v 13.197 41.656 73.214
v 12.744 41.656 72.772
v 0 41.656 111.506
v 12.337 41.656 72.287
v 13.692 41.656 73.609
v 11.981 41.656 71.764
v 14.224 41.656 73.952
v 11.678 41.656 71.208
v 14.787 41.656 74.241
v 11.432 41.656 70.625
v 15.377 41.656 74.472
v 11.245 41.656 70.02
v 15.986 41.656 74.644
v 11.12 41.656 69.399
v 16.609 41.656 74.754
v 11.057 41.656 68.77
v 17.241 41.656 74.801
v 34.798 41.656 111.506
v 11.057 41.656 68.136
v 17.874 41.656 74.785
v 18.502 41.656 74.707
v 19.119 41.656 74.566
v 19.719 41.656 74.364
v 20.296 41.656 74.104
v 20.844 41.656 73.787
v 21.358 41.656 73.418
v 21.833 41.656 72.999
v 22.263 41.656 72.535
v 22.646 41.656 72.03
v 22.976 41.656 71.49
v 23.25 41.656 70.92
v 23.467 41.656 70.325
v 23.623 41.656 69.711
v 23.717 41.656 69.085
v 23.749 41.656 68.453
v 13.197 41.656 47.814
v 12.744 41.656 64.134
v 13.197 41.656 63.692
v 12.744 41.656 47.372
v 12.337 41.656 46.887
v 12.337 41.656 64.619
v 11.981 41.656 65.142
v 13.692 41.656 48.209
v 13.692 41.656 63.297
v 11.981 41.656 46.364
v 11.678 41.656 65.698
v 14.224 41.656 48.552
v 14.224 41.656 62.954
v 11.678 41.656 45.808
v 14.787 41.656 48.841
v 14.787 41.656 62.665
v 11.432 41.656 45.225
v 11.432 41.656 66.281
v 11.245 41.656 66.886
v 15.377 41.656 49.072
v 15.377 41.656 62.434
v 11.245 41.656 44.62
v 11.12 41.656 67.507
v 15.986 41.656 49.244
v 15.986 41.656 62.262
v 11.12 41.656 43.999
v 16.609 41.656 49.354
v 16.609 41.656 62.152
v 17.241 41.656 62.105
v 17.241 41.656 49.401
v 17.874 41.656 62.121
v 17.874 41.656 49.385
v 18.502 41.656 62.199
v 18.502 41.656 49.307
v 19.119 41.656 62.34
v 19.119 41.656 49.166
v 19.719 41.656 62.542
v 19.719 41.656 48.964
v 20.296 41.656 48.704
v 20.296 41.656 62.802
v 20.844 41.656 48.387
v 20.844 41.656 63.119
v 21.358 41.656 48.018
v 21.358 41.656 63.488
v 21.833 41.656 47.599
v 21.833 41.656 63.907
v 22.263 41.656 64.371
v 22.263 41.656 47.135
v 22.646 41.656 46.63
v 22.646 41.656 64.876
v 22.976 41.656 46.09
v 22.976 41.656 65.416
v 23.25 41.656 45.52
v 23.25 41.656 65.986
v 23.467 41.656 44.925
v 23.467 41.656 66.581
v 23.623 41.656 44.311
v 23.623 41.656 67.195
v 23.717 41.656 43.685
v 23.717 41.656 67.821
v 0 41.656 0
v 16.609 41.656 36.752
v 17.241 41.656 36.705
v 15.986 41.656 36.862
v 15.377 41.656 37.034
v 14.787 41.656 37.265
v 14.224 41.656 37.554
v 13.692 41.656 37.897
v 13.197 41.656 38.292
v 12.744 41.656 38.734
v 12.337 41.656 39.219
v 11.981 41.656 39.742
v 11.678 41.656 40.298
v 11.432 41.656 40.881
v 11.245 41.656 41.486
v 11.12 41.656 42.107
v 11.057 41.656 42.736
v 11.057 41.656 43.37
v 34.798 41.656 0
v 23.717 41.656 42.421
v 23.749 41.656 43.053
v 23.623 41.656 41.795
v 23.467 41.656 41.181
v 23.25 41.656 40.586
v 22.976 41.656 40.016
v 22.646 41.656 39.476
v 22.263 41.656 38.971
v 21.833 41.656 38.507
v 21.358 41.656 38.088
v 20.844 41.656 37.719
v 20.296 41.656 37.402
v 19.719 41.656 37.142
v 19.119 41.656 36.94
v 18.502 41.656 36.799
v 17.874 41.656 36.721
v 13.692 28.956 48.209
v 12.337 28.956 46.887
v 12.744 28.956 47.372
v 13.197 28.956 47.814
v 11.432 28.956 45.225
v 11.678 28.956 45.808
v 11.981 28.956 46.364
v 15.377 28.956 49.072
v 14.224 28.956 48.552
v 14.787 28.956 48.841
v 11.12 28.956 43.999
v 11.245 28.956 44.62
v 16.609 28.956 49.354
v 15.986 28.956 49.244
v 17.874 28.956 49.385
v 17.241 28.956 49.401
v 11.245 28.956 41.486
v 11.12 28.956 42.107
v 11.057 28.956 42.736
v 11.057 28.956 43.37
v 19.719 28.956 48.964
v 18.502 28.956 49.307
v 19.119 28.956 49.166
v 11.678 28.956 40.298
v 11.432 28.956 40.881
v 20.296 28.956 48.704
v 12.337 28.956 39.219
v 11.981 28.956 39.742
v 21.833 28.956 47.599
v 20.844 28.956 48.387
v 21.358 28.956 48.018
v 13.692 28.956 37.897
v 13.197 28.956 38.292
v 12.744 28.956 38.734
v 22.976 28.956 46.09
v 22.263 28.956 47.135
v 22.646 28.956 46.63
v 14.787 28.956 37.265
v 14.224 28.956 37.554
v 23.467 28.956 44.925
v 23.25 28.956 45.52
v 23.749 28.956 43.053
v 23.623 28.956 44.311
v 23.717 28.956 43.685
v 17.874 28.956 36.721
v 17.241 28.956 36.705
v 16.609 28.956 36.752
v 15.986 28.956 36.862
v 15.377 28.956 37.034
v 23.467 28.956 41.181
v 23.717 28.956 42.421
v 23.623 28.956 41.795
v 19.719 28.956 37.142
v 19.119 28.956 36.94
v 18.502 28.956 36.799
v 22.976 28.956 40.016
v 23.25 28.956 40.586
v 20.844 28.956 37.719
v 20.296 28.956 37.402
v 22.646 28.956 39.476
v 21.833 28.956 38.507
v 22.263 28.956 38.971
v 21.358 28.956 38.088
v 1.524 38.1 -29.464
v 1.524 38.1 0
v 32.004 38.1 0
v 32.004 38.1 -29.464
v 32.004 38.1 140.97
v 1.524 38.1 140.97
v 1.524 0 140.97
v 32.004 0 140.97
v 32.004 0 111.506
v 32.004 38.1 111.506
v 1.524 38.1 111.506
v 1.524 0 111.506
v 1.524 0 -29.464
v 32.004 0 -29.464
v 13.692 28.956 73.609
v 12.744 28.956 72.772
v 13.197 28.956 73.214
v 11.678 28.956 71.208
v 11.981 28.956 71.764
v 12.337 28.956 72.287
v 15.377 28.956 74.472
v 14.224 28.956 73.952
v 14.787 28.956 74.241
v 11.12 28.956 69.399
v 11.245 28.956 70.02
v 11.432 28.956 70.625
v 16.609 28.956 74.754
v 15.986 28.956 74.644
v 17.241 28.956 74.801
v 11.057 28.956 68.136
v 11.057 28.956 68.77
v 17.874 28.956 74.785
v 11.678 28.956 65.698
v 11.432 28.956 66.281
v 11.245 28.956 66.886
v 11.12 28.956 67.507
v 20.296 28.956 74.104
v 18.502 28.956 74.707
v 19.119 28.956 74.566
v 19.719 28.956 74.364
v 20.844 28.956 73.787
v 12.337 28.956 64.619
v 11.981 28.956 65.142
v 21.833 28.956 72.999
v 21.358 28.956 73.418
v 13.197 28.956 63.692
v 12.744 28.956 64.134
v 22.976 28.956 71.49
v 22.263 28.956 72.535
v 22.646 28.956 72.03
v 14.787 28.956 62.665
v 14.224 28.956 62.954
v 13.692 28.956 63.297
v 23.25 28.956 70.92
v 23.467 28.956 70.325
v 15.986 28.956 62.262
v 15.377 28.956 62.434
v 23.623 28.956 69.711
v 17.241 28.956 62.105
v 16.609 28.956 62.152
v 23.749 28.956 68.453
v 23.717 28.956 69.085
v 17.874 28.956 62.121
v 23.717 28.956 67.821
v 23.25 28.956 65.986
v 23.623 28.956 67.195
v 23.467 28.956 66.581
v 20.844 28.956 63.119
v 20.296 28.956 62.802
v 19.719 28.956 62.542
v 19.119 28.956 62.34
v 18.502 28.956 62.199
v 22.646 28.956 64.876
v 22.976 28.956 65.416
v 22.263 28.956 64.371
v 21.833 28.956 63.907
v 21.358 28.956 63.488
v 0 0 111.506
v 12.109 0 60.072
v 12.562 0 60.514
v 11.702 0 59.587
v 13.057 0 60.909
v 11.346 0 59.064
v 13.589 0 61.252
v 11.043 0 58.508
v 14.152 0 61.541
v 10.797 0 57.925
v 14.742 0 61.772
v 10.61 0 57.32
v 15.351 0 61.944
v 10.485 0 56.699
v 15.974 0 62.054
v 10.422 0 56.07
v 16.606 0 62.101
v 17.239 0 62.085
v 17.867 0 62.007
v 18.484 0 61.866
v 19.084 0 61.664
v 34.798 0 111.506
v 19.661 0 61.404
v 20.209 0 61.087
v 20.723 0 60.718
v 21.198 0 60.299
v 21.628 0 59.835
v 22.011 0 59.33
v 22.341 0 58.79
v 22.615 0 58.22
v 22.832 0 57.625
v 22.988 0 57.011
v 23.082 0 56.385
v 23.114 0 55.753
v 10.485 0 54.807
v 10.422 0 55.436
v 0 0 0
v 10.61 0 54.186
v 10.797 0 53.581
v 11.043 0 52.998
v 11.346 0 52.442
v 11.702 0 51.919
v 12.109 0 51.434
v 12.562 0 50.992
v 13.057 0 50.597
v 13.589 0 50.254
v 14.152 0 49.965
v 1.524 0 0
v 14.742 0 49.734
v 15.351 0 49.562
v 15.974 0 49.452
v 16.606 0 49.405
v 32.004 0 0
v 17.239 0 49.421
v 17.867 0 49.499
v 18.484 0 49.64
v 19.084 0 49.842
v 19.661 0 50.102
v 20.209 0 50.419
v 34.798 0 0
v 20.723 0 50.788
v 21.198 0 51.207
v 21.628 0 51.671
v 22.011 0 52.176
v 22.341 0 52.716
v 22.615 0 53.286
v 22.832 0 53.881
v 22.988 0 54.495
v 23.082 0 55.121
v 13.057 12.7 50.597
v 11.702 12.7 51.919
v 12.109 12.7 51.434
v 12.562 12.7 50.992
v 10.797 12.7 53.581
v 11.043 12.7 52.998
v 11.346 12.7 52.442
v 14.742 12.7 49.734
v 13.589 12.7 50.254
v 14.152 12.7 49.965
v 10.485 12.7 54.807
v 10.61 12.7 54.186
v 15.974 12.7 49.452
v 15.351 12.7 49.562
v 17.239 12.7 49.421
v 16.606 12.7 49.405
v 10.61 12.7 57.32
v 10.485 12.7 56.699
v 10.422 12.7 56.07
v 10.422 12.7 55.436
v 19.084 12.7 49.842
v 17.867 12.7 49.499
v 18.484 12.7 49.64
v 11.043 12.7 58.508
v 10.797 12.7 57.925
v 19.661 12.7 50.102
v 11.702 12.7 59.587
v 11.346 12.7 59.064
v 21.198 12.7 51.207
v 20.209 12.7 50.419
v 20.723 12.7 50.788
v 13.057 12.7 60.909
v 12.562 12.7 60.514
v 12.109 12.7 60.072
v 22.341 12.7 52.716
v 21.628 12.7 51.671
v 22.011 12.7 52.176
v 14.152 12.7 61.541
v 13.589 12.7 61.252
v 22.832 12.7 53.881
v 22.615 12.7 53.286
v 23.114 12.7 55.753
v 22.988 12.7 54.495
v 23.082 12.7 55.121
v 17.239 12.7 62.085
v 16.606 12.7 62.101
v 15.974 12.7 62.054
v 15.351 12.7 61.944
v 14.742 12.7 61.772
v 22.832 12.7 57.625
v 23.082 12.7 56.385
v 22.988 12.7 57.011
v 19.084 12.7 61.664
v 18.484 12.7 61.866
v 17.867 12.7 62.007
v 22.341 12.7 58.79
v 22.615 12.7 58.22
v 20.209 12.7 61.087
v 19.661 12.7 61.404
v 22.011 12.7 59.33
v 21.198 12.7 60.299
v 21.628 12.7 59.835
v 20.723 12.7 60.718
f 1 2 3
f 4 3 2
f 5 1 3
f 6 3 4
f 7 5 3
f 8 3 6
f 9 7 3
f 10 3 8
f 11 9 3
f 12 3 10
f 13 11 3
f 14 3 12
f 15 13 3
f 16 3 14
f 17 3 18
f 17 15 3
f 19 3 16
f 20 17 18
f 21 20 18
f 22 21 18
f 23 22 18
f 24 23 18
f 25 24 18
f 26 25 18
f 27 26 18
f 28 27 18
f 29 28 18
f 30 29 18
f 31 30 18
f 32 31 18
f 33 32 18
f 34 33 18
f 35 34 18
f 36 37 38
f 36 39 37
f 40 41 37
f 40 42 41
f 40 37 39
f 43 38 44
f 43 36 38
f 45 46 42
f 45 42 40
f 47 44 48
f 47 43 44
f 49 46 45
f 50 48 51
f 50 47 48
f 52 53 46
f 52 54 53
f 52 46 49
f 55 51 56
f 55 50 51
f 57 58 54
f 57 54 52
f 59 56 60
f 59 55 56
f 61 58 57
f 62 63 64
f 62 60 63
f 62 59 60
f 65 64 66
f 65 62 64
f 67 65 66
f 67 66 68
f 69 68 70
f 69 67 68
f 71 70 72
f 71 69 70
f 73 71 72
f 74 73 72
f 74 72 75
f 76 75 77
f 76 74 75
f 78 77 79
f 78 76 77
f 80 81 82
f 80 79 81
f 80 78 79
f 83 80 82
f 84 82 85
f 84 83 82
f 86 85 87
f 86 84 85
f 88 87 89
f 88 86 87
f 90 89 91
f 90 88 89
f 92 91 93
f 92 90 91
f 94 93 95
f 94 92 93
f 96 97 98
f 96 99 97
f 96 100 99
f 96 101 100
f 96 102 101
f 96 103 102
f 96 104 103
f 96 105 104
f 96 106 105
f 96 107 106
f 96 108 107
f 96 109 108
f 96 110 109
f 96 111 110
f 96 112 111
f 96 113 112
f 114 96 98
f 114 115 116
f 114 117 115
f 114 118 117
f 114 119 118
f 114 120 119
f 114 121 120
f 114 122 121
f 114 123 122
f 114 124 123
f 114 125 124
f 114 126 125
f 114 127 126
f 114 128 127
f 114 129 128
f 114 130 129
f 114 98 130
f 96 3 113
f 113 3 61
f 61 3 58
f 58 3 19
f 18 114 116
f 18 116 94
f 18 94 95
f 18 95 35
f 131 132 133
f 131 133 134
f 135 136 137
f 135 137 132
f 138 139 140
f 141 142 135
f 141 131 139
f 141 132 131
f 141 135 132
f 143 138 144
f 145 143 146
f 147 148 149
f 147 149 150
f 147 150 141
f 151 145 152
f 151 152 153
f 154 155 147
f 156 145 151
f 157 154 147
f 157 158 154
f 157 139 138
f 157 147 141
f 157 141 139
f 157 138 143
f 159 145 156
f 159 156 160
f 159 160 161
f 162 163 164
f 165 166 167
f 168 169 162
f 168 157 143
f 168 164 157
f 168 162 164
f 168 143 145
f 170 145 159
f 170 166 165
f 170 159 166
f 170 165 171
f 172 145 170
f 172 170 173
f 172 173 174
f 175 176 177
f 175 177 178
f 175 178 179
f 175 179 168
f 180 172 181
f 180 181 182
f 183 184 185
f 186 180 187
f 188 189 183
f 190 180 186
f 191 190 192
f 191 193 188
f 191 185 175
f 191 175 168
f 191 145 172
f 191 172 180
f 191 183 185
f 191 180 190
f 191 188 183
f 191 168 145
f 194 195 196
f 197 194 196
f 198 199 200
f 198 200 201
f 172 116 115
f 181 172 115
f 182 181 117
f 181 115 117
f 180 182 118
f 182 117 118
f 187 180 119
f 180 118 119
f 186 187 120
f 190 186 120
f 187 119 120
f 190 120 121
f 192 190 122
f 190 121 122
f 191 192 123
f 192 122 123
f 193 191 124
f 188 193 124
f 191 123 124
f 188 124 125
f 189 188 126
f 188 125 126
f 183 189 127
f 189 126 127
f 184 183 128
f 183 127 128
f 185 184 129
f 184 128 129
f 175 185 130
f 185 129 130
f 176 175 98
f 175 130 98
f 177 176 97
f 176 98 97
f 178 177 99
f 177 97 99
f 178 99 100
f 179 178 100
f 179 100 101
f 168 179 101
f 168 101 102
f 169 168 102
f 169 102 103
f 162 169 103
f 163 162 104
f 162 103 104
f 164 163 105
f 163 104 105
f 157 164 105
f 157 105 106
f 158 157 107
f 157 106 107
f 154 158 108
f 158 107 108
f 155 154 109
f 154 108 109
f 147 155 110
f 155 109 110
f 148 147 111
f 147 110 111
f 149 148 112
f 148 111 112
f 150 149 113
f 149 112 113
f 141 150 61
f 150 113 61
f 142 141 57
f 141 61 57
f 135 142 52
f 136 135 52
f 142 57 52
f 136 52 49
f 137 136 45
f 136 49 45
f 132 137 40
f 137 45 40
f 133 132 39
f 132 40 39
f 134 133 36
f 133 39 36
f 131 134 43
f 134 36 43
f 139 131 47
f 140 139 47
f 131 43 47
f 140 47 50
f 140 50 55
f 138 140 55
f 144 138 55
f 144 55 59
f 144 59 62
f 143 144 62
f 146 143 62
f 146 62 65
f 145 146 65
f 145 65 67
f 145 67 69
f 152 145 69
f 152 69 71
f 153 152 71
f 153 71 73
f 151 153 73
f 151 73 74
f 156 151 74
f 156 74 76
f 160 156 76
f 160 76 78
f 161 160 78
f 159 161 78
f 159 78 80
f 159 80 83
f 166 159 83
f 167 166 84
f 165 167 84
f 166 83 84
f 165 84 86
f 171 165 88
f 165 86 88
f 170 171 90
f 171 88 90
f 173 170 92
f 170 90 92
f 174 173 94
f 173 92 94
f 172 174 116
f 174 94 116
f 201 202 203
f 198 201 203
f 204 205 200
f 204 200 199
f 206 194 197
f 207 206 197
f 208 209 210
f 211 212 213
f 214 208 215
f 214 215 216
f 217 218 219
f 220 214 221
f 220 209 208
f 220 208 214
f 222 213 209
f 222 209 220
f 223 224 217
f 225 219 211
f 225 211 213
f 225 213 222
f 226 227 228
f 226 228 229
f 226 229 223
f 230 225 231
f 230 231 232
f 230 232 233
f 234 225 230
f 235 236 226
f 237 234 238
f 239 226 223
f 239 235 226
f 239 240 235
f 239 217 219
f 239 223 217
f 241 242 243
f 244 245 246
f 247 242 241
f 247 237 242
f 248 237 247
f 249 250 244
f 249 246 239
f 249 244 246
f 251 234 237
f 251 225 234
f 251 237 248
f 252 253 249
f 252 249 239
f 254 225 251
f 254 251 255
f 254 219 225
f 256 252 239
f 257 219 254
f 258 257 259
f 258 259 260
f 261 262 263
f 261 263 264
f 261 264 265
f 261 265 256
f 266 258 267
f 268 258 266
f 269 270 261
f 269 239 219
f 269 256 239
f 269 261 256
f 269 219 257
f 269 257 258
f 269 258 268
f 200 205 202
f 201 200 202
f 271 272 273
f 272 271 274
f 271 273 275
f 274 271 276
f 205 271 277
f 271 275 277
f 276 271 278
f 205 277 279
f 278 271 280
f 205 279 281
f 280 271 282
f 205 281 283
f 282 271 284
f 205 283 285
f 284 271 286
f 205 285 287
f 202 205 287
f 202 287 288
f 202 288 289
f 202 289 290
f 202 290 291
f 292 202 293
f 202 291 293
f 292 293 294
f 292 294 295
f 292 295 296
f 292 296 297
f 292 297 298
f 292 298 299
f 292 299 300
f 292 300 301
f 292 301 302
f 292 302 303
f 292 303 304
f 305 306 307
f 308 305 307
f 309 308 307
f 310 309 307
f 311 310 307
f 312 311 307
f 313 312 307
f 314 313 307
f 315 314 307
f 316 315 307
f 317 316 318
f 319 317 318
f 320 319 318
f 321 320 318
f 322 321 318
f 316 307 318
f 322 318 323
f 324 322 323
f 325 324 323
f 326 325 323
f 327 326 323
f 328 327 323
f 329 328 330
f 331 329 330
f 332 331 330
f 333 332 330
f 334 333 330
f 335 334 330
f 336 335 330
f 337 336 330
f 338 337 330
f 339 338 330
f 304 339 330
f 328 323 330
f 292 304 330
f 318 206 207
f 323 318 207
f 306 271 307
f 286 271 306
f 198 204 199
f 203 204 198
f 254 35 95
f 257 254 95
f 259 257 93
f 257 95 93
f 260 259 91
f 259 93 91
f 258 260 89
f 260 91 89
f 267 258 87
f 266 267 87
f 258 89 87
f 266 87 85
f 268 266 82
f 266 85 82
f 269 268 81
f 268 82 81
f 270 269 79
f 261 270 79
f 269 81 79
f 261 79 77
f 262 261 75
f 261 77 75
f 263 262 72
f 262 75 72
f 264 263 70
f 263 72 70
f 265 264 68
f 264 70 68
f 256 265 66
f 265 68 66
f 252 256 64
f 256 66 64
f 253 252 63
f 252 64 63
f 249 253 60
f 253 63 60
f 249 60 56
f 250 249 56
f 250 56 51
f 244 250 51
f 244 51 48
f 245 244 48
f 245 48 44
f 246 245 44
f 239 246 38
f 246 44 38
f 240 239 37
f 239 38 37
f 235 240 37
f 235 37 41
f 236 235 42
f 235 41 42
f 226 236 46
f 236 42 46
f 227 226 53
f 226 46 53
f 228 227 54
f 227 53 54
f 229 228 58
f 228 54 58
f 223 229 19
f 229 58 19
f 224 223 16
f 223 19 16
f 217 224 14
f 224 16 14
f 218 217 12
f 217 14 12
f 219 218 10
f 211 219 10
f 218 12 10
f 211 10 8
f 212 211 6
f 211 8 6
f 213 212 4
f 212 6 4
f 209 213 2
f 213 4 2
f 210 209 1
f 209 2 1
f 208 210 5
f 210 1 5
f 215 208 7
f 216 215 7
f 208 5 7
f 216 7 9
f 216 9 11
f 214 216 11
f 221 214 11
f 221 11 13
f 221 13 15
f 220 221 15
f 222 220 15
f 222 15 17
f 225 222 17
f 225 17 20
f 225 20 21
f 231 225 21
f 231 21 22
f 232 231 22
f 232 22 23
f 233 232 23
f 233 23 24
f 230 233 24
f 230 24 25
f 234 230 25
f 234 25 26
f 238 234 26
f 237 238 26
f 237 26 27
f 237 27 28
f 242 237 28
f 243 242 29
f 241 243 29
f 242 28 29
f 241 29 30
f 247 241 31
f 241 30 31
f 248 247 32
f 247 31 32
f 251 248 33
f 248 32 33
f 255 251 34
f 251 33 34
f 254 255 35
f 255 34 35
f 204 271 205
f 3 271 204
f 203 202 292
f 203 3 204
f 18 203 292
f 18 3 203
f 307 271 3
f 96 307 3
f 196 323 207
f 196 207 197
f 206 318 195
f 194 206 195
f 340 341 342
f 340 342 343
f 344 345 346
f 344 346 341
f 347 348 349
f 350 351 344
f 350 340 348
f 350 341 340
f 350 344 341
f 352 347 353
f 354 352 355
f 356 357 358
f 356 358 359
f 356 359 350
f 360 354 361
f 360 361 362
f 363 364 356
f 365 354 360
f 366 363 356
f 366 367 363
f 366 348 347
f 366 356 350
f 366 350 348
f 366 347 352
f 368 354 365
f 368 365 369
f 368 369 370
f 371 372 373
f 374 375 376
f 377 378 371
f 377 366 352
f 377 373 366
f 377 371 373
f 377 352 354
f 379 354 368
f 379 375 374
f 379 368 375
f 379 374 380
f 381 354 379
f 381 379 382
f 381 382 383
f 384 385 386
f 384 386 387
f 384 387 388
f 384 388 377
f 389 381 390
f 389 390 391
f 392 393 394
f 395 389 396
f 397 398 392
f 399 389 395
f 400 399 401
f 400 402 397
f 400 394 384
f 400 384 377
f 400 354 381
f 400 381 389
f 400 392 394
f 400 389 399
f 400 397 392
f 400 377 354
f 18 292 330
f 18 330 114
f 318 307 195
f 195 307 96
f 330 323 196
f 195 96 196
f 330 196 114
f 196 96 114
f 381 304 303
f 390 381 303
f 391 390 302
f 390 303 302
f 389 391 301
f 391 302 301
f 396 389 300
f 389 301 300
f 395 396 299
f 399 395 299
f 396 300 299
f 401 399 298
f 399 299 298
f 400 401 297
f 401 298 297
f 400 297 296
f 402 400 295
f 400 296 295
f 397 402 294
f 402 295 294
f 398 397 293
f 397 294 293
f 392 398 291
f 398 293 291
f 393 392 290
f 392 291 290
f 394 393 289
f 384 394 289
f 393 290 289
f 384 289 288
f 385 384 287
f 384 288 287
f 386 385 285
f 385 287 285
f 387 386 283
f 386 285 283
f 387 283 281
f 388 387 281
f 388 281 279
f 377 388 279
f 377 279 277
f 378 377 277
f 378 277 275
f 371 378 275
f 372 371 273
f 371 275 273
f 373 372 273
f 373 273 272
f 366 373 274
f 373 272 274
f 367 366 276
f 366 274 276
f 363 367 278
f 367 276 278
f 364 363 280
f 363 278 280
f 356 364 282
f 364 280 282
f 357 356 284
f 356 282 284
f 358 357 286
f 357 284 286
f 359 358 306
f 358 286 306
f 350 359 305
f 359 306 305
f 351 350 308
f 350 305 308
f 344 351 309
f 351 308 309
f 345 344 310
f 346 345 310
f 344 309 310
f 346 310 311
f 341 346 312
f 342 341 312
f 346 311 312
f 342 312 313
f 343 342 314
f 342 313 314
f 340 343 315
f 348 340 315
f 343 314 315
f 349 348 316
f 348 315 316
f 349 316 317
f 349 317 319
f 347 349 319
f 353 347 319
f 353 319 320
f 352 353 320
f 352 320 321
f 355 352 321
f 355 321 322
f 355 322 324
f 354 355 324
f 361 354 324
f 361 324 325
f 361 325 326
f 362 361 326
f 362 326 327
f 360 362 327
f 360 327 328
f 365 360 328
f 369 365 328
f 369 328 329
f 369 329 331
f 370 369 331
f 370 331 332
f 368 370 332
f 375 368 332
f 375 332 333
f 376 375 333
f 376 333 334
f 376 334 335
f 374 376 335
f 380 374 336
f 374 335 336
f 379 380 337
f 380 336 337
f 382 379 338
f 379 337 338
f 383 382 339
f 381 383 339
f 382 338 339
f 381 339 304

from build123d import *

# Parameters (mm, degrees)
SKETCH1_W           = 34.798
SKETCH1_H           = 41.656
BOSS_EXTRUDE2_DEPTH = 111.506
SKETCH2_W           = 30.48
SKETCH2_H           = 38.1
BOSS_EXTRUDE3_DEPTH = 29.464
SKETCH3_R           = 6.35
CUT_EXTRUDE2_DEPTH  = 12.7
SKETCH4_R           = 6.35
CUT_EXTRUDE3_DEPTH  = 12.7


with BuildPart() as part:
    # Sketch1 → Boss-Extrude2 (new body)
    with BuildSketch(Plane.XY):
        with Locations((17.399, 20.828)):
            Rectangle(SKETCH1_W, SKETCH1_H)
    extrude(amount=BOSS_EXTRUDE2_DEPTH)

    # Sketch2 → Boss-Extrude3 (add)
    with BuildSketch(Plane.XY.offset(111.506)):
        with Locations((16.764, 19.05)):
            Rectangle(SKETCH2_W, SKETCH2_H)
    boss_extrude3 = extrude(amount=BOSS_EXTRUDE3_DEPTH)

    # Mirror1: Boss-Extrude3 across plane
    add(boss_extrude3.mirror(Plane(origin=(0, 0, 55.753), x_dir=(1, 0, 0), z_dir=(0, 0, -1))))

    # Sketch3 → Cut-Extrude2 (cut)
    with BuildSketch(Plane.XZ):
        with Locations((16.764, 55.753)):
            Circle(SKETCH3_R)
    extrude(amount=-CUT_EXTRUDE2_DEPTH, mode=Mode.SUBTRACT)

    # Sketch4 → Cut-Extrude3 (cut)
    with BuildSketch(Plane(origin=(0, 41.656, 0), x_dir=(1, 0, 0), z_dir=(0, 1, 0))):
        with Locations((17.399, -43.053)):
            Circle(SKETCH4_R)
        with Locations((17.399, -68.453)):
            Circle(SKETCH4_R)
    extrude(amount=-CUT_EXTRUDE3_DEPTH, mode=Mode.SUBTRACT)


solid = part.part
